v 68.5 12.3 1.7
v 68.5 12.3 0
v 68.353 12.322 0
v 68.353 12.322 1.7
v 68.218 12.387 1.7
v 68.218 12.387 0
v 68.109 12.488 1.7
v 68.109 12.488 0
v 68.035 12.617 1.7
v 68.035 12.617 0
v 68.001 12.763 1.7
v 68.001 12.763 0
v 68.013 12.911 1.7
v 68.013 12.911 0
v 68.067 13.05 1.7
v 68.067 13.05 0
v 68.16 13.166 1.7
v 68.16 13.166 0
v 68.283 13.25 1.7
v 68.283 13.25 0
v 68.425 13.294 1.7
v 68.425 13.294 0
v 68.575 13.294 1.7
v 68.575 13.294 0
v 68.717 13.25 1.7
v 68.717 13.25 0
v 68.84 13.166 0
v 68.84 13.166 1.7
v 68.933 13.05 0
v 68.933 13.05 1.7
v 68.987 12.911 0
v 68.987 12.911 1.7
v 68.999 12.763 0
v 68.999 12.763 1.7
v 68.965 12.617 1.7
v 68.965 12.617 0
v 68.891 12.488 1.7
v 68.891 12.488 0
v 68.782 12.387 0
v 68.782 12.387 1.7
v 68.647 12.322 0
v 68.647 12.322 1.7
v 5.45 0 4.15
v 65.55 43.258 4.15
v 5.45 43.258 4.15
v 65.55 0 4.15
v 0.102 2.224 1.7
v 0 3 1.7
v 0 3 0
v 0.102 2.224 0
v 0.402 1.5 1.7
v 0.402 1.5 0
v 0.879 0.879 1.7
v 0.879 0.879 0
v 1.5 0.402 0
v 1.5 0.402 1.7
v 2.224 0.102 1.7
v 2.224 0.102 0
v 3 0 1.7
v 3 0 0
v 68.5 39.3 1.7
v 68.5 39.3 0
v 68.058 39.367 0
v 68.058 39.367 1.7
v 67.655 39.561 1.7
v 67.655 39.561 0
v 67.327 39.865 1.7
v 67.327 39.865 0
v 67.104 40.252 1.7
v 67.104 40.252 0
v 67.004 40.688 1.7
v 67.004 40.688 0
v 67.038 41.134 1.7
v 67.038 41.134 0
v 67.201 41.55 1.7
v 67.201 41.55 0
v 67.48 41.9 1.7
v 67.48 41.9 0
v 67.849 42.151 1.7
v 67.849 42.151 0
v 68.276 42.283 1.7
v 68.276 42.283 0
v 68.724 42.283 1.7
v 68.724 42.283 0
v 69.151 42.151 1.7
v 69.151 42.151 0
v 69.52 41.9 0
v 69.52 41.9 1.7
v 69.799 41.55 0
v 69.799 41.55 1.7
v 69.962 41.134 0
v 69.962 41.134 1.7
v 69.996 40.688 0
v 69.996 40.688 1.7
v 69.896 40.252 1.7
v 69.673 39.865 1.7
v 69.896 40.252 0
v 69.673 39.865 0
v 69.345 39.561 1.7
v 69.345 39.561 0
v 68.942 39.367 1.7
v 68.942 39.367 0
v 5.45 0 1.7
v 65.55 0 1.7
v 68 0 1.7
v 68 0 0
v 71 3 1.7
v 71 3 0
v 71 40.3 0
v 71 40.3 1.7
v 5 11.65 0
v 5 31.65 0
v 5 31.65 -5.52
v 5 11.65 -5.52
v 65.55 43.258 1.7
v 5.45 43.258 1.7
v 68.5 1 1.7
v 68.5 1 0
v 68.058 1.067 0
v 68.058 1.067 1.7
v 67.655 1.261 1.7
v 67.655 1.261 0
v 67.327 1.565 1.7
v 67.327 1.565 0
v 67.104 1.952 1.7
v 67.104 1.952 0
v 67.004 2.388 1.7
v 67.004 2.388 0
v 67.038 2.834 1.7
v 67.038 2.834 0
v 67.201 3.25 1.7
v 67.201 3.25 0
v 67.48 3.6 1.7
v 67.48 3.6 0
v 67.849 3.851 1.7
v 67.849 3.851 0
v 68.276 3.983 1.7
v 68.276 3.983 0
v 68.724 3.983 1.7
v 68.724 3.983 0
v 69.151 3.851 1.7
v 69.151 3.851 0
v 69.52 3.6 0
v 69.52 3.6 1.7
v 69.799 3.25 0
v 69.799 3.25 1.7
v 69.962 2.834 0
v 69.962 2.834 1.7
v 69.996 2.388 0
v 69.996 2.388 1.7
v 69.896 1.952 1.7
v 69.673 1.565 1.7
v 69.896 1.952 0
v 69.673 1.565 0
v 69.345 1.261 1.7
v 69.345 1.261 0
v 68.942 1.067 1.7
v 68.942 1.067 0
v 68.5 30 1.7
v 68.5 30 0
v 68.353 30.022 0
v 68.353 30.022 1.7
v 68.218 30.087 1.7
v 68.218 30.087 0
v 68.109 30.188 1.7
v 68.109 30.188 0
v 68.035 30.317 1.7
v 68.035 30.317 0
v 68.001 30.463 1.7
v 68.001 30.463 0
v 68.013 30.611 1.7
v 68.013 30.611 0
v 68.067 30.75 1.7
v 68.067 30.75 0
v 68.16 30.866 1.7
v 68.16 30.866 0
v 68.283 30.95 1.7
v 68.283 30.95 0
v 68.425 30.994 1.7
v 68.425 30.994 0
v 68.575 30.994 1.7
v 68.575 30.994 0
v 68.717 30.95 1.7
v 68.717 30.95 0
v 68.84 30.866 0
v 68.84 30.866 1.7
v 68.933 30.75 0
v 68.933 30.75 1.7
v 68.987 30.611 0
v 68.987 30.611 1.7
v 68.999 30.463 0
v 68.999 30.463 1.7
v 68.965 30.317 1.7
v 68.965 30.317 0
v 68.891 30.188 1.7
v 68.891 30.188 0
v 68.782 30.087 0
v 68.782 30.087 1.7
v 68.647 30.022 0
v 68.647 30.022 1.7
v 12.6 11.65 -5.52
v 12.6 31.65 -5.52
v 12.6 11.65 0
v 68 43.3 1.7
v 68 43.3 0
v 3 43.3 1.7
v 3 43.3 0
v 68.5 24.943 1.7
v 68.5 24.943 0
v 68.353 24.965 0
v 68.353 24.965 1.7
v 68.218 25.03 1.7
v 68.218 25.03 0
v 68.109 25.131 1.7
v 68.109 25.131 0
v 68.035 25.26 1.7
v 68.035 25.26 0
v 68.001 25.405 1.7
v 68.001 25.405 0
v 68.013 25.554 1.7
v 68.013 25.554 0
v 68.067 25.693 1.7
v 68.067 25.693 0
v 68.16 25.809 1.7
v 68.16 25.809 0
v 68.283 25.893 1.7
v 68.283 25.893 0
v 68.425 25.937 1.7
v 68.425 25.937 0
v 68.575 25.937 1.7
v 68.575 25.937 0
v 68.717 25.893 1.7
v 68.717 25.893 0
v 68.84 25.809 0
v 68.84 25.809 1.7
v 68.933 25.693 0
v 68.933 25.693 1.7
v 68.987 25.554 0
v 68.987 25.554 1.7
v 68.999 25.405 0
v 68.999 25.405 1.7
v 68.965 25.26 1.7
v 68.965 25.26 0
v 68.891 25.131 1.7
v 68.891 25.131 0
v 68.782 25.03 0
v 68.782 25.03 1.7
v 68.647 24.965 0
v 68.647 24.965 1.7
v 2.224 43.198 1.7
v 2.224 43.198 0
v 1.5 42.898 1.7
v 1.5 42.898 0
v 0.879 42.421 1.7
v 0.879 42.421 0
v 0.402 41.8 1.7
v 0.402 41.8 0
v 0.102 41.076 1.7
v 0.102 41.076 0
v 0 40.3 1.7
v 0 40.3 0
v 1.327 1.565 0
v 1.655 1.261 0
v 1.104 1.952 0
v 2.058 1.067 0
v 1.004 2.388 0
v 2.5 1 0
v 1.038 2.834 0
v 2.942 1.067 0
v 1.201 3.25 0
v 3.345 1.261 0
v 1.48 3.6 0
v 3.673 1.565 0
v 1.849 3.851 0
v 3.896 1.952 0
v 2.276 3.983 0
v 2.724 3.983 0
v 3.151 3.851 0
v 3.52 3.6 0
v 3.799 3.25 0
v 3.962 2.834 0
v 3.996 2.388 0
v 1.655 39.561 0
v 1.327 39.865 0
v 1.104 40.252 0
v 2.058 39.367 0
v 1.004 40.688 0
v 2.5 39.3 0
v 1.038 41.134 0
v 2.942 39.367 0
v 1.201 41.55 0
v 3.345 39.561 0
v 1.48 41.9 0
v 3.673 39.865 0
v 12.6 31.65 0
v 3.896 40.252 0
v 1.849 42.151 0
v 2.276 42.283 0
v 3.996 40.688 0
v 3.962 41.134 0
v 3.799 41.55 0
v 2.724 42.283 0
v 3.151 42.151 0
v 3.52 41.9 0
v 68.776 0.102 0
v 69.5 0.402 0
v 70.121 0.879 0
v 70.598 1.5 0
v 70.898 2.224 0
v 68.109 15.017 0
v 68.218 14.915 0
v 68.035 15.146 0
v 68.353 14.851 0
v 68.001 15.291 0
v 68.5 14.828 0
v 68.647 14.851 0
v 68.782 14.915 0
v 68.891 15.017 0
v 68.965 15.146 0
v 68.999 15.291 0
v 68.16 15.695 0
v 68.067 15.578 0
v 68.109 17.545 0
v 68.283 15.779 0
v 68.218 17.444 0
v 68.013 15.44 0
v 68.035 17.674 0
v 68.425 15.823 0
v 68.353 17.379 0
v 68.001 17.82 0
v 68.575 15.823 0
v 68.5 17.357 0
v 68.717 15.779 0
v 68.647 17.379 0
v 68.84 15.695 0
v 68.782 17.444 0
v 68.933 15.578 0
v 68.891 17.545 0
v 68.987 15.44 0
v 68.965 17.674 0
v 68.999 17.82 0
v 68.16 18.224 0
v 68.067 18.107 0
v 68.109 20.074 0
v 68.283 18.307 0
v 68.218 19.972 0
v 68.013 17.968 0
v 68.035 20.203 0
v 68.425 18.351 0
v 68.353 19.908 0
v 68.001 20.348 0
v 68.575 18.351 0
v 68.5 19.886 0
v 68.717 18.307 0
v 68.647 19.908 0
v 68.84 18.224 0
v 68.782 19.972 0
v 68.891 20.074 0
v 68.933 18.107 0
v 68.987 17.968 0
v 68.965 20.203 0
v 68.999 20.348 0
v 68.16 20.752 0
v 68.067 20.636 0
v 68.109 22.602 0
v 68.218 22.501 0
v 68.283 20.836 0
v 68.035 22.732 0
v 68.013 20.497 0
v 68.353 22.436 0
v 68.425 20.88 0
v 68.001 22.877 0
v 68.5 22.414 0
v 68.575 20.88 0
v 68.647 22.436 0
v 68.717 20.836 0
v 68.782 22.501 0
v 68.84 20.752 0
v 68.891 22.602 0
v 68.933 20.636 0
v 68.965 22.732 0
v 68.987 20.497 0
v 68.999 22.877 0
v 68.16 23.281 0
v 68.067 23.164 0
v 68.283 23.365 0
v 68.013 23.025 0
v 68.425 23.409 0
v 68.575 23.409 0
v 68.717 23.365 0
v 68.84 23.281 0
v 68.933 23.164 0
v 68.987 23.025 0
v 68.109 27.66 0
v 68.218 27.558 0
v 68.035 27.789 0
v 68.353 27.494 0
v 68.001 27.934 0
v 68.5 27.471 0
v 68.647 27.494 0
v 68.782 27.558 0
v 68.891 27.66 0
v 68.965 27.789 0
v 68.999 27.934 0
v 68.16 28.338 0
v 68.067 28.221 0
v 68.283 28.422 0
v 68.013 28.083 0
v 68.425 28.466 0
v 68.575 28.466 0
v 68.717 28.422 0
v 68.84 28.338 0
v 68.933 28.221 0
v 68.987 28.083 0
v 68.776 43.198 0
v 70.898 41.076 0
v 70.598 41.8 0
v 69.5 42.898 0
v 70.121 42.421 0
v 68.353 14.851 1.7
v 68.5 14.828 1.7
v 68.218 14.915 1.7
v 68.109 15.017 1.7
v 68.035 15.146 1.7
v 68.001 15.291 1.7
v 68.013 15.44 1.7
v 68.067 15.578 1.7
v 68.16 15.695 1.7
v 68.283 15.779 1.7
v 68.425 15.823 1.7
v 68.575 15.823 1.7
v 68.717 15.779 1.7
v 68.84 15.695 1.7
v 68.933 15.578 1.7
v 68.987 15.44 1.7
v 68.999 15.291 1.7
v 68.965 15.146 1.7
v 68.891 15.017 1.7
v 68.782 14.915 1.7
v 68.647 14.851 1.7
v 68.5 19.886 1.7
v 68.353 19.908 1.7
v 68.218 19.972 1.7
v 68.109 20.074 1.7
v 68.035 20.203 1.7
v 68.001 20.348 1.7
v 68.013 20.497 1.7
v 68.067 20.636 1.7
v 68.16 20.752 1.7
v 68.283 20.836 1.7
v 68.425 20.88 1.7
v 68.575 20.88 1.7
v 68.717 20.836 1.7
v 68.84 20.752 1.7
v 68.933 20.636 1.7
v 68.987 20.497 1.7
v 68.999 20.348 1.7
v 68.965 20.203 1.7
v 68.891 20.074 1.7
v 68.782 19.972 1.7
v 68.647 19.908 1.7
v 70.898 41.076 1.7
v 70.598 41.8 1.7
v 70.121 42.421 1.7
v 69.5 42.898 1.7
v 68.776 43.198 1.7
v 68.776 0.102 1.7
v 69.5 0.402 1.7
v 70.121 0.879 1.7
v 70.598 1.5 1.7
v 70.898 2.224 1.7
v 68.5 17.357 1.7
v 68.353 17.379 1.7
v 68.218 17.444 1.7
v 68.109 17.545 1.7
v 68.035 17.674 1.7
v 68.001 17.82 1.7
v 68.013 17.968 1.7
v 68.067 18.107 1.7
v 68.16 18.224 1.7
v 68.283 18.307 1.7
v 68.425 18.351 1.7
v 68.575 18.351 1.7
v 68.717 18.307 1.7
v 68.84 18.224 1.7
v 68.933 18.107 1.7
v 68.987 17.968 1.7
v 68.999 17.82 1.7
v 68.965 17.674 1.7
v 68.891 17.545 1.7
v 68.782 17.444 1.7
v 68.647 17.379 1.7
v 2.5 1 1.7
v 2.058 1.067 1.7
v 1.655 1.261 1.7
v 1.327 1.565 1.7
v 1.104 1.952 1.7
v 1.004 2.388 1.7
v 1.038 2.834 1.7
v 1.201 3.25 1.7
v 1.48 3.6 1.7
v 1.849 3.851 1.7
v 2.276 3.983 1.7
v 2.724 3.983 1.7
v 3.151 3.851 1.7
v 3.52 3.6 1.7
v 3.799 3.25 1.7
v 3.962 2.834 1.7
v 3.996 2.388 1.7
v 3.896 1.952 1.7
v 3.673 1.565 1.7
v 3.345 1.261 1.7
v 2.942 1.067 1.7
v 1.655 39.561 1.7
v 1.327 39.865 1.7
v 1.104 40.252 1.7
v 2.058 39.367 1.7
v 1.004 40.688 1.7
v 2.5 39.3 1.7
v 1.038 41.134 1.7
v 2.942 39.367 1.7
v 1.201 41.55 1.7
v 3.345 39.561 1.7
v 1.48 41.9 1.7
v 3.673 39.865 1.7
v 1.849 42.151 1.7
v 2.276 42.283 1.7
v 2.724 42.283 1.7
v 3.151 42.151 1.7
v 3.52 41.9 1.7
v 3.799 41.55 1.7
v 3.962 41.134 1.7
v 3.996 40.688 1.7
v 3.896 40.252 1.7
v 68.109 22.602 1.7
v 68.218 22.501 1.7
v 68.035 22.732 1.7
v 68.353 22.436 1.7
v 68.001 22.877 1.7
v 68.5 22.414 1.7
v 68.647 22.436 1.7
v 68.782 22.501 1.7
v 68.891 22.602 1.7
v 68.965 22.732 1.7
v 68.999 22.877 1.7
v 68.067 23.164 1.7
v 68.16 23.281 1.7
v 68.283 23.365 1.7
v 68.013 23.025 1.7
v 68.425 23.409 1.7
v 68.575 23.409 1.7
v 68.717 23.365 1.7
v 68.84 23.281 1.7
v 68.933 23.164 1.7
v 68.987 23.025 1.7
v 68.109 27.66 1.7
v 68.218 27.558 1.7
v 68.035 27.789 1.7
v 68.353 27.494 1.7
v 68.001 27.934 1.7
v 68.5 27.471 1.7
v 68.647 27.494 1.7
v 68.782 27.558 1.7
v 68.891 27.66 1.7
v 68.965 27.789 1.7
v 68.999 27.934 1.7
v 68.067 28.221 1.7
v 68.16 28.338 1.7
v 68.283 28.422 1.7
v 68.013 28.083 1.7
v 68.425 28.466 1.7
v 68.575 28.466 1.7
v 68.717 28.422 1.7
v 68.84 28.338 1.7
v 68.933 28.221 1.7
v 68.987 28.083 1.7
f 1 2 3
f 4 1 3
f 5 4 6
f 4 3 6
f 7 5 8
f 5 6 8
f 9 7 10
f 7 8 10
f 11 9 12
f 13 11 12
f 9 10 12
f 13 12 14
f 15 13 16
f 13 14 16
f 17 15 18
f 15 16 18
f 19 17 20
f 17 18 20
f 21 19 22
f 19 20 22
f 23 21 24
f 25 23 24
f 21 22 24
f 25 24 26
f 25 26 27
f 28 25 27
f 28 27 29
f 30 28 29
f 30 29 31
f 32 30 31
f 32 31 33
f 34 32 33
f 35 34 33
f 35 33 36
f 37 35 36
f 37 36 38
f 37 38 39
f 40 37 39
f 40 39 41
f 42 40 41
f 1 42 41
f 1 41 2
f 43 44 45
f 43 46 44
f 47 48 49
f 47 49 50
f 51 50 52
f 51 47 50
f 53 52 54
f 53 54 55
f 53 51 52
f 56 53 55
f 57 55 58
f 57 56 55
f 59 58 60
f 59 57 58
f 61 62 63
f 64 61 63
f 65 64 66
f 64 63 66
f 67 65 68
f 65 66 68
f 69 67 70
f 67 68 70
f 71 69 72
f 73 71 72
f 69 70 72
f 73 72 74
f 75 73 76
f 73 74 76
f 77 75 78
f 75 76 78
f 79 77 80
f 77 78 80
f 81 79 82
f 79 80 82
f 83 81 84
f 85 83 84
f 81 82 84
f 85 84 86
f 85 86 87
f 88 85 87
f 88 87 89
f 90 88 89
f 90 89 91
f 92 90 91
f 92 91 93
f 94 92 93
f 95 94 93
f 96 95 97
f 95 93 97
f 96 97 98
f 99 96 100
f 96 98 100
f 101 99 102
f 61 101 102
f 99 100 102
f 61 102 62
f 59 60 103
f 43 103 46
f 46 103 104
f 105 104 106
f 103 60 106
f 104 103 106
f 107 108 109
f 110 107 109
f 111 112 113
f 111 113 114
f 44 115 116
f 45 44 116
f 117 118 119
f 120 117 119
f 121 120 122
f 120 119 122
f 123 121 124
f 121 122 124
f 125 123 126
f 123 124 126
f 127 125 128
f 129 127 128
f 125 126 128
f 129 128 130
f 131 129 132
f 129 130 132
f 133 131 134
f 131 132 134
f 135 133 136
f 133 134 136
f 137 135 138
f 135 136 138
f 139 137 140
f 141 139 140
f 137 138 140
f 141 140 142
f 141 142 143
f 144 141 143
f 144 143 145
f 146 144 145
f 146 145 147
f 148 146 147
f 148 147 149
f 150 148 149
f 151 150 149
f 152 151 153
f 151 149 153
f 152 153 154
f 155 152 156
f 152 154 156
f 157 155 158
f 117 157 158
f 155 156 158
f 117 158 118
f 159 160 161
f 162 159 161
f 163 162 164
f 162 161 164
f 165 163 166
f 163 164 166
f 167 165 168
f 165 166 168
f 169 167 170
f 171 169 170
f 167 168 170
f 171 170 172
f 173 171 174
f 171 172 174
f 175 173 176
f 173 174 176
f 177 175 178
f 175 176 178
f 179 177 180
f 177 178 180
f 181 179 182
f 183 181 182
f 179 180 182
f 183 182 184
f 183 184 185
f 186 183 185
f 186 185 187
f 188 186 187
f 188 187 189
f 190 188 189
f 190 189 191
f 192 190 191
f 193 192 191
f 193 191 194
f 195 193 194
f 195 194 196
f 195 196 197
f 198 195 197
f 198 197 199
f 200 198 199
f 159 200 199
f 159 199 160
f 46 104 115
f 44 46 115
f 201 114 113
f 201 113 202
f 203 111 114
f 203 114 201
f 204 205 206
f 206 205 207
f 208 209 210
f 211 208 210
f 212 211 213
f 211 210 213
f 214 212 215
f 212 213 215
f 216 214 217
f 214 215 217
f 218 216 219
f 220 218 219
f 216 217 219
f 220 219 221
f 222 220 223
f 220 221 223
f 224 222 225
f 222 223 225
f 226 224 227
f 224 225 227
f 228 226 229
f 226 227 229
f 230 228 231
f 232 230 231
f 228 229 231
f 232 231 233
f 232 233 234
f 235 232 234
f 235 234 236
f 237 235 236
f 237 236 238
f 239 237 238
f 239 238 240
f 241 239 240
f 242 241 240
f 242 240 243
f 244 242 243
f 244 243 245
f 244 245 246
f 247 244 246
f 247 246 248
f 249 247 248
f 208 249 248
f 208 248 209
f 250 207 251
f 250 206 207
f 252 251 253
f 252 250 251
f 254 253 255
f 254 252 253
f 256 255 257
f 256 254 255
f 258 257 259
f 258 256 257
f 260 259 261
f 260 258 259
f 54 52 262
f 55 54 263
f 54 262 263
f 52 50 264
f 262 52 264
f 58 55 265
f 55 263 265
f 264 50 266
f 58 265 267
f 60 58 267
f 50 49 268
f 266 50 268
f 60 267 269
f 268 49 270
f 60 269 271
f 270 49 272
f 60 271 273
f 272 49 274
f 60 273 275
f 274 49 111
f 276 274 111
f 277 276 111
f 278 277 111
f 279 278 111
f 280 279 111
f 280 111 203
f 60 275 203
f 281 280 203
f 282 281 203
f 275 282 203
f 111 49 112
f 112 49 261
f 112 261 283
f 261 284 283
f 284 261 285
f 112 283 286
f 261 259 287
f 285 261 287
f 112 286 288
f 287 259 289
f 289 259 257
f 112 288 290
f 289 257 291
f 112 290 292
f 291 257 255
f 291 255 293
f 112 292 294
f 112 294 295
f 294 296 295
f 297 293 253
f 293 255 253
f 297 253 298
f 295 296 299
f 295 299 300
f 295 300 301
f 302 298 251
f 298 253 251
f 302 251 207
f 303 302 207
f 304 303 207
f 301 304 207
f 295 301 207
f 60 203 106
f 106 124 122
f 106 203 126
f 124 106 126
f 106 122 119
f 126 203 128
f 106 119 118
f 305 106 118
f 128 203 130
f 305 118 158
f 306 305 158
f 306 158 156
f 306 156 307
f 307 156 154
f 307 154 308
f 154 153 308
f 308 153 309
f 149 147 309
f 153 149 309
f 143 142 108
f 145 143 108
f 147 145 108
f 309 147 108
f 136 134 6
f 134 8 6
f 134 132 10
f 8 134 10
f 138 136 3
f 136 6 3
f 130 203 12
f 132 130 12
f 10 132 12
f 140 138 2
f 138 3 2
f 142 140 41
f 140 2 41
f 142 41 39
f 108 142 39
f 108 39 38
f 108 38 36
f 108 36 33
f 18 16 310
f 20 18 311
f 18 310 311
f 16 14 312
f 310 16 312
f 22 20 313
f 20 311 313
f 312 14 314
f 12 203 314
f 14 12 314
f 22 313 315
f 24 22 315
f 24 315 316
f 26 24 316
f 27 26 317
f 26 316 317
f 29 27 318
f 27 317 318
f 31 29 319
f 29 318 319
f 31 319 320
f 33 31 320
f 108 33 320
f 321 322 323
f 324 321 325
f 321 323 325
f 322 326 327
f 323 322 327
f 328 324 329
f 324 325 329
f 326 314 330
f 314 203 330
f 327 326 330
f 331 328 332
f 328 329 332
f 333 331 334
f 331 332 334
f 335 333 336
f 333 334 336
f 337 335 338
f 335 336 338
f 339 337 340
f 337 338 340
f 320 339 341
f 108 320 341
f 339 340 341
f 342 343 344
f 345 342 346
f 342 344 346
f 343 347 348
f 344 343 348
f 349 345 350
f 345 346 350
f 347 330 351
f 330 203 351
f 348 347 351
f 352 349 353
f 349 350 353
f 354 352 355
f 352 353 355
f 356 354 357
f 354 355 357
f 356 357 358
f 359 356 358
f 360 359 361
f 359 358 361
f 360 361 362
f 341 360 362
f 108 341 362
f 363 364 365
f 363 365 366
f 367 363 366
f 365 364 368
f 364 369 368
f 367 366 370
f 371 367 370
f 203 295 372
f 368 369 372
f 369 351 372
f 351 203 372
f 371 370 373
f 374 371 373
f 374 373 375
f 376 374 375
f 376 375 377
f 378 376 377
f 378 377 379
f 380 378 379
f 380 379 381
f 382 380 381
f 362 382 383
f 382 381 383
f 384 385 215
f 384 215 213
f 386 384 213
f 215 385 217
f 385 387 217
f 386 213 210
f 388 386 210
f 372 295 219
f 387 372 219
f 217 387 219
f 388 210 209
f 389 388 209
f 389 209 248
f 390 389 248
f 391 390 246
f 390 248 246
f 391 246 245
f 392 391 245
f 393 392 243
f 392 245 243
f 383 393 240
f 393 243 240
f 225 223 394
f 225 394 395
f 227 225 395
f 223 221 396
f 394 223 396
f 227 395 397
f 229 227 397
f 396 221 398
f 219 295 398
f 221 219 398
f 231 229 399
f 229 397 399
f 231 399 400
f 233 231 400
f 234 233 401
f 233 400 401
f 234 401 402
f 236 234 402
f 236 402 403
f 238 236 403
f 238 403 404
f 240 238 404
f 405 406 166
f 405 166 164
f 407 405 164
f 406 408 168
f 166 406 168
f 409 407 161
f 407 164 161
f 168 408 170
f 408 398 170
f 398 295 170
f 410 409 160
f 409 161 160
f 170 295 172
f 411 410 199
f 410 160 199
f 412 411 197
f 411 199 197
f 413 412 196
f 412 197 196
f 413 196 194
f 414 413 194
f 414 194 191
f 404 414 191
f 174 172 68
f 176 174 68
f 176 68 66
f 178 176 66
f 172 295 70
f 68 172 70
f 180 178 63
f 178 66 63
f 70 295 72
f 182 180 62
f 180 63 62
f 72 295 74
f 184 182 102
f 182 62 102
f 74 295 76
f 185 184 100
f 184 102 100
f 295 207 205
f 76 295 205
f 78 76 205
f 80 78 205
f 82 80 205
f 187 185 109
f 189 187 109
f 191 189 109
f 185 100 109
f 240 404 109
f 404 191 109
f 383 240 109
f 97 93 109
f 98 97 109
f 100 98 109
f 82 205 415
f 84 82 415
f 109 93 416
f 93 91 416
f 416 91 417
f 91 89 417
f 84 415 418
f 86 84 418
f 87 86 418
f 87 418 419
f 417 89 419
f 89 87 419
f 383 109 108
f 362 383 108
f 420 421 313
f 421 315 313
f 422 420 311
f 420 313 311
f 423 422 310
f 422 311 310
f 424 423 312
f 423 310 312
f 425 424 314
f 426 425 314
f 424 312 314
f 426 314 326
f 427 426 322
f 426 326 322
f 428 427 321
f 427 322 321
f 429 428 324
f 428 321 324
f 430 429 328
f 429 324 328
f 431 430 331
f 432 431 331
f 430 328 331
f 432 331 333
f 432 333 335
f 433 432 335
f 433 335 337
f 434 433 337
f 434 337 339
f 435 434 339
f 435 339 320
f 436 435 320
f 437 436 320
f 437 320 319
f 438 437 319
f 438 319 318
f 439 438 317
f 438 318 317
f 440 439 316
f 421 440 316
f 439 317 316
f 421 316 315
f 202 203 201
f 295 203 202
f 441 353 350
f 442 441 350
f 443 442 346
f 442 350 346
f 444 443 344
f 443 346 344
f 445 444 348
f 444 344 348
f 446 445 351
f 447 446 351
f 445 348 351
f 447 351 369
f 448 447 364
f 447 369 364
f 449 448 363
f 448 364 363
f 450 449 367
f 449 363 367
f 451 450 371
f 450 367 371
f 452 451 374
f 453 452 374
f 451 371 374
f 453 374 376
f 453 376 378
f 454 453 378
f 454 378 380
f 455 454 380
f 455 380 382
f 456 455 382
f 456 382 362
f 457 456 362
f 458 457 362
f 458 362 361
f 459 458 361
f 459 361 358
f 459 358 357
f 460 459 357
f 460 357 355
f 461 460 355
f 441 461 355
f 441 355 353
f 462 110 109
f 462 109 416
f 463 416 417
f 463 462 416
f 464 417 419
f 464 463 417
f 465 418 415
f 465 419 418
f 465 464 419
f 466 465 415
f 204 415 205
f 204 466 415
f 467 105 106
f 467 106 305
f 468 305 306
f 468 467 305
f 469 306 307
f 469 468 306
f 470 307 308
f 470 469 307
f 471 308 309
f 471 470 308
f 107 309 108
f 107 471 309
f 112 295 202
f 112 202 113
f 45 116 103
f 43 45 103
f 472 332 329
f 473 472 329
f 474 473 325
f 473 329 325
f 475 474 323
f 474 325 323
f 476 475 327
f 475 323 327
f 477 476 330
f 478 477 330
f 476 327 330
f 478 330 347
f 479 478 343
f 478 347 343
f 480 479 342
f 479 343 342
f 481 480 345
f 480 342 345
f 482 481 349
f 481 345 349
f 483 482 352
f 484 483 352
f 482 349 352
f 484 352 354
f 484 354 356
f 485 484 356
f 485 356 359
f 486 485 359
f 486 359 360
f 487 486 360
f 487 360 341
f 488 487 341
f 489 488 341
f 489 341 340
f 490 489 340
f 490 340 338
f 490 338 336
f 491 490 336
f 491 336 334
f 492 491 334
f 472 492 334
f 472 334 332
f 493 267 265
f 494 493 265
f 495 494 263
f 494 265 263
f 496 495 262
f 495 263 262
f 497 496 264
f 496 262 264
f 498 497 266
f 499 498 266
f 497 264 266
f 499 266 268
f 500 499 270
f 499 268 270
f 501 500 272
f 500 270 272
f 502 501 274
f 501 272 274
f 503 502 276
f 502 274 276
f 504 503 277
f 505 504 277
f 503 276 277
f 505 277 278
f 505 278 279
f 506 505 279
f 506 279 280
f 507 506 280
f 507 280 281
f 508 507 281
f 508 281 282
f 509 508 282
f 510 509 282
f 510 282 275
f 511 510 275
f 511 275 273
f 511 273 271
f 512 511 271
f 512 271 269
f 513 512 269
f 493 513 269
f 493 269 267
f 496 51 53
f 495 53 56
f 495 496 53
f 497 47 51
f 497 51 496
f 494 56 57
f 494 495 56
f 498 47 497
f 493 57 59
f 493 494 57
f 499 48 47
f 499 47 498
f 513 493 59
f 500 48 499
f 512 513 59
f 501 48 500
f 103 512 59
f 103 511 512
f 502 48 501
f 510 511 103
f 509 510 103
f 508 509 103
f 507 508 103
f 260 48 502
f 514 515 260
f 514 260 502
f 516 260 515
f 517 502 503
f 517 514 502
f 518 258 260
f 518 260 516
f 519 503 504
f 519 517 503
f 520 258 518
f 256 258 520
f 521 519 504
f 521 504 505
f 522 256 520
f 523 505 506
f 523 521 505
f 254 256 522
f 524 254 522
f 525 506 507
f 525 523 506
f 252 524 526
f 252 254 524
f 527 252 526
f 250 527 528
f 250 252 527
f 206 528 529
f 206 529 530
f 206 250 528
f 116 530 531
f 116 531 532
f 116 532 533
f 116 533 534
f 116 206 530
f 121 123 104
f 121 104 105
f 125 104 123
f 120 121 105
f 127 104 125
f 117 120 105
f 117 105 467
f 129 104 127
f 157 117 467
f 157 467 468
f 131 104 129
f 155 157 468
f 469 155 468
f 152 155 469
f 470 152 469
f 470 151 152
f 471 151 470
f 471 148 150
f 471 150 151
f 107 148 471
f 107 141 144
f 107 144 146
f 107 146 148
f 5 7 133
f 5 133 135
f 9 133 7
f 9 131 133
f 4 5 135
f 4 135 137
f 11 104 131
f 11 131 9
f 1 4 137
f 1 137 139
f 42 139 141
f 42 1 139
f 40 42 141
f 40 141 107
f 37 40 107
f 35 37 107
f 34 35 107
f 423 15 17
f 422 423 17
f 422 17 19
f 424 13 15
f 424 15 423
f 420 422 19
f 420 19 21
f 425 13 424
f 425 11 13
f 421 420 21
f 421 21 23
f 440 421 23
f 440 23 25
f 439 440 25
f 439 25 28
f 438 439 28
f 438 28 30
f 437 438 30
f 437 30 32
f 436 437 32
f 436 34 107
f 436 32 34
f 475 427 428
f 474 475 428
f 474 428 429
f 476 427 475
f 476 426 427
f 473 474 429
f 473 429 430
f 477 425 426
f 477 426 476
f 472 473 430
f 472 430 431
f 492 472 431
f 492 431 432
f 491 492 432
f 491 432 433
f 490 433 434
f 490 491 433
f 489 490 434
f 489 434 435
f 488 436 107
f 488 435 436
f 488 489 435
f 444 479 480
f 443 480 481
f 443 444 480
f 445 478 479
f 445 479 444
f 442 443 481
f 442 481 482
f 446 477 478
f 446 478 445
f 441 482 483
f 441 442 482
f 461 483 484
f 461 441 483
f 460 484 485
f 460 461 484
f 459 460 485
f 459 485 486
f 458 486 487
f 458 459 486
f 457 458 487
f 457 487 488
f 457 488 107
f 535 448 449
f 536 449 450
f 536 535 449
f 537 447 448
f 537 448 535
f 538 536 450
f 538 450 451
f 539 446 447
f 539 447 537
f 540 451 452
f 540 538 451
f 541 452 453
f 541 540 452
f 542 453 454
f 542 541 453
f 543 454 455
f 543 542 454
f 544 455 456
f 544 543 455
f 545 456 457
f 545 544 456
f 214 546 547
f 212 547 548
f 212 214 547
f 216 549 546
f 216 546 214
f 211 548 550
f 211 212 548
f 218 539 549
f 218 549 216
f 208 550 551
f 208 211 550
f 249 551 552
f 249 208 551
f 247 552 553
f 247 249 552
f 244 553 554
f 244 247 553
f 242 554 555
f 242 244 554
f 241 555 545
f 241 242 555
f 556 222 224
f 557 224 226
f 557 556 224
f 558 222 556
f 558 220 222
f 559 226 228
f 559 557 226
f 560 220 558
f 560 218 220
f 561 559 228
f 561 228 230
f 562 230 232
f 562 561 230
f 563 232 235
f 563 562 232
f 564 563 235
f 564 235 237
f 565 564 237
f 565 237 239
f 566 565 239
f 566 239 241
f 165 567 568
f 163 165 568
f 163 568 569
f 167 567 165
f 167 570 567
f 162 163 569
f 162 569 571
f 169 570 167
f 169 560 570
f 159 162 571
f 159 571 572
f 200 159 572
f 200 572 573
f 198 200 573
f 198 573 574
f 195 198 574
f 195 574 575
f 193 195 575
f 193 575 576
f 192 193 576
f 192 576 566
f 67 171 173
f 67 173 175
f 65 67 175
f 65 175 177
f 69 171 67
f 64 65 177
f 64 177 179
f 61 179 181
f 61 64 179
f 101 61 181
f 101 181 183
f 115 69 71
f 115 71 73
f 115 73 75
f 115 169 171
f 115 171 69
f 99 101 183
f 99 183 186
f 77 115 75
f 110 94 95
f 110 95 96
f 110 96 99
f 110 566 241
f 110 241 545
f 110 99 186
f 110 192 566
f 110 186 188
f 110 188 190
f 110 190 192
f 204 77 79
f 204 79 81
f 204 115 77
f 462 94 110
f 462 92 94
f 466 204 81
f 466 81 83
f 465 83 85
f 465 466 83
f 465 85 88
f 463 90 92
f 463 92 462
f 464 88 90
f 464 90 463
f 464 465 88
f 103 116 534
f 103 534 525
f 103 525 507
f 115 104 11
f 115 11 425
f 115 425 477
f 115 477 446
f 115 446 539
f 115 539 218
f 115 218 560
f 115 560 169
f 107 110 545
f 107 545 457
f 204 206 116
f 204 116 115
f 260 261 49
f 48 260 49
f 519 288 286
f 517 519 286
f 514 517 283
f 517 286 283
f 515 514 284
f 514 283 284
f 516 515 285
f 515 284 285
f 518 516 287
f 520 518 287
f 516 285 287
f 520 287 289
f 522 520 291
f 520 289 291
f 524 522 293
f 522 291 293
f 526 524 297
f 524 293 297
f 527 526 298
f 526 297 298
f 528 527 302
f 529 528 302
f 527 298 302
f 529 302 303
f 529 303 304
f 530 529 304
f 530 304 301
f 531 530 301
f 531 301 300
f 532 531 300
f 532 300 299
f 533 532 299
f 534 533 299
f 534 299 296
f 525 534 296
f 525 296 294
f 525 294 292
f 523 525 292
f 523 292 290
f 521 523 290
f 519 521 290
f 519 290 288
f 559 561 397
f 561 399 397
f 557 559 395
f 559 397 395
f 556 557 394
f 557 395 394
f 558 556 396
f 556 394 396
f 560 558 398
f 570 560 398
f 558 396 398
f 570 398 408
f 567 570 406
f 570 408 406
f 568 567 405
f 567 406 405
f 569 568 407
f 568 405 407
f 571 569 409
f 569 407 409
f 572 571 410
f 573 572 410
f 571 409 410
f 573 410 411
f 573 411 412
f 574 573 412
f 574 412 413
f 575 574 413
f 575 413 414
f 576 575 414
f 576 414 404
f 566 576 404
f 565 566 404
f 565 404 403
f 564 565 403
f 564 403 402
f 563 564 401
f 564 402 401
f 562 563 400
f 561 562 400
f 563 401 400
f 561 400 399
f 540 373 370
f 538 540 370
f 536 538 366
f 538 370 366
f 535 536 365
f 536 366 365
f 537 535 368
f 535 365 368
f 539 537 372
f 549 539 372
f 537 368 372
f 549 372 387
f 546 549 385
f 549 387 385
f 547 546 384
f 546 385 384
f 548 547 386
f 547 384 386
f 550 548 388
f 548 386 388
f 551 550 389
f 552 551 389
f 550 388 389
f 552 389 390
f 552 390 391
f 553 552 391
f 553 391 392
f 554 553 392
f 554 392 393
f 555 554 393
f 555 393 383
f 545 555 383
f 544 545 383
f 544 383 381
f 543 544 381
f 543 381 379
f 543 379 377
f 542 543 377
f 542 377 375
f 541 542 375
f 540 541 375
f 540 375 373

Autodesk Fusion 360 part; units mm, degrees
sketch "Sketch1" plane through (0, 0, 0) normal (0, 0, 1) x (1, 0, 0) in component "2.4\" LCD Module"
  line L0 (0, 0) -> (71, 0)
  line L1 (71, 0) -> (71, 43.3)
  line L2 (71, 43.3) -> (0, 43.3)
  line L3 (0, 43.3) -> (0, 0)
  dimension "d1" = 71
  dimension "d2" = 43.3
extrude "Extrude1" add sketch "Sketch1" along normal blind 1.7 in component "2.4\" LCD Module"
hole "Hole1" at (68.5, 2.5, 1.7) direction (0, 0, -1) diameter 3 depth 5 tip angle 180 in component "2.4\" LCD Module"
hole "Hole2" at (68.5, 40.8, 1.7) direction (0, 0, -1) diameter 3 depth 5 tip angle 180 in component "2.4\" LCD Module"
hole "Hole3" at (2.5, 2.5, 1.7) direction (0, 0, -1) diameter 3 depth 5 tip angle 180 in component "2.4\" LCD Module"
hole "Hole4" at (2.5, 40.8, 1.7) direction (0, 0, -1) diameter 3 depth 5 tip angle 180 in component "2.4\" LCD Module"
fillet "Fillet1" radius 3 4 edges at (71, 0, 0.85) (0, 0, 0.85) (71, 43.3, 0.85) (0, 43.3, 0.85) in component "2.4\" LCD Module"
sketch "Sketch2" plane through (0, 0, 1.7) normal (0, 0, 1) x (-1, 0, 0) in component "2.4\" LCD Module"
  arc A0 (-3, -43.3) -> (0, -40.3) centre (-3, -40.3) ccw
  line L0 (0, -40.3) -> (0, -3)
  arc A1 (0, -3) -> (-3, 0) centre (-3, -3) ccw
  line L1 (-3, 0) -> (-68, 0)
  arc A2 (-68, 0) -> (-71, -3) centre (-68, -3) ccw
  line L2 (-71, -3) -> (-71, -40.3)
  arc A3 (-71, -40.3) -> (-68, -43.3) centre (-68, -40.3) ccw
  line L3 (-68, -43.3) -> (-3, -43.3)
  circle A4 centre (-2.5, -40.8) radius 1.5
  circle A5 centre (-2.5, -2.5) radius 1.5
  circle A6 centre (-68.5, -40.8) radius 1.5
  circle A7 centre (-68.5, -2.5) radius 1.5
  line L4 (-5.4496, 0.0416) -> (-65.5496, 0.0416)
  line L5 (-65.5496, 0.0416) -> (-65.5496, -43.2584)
  line L6 (-65.5496, -43.2584) -> (-5.4496, -43.2584)
  line L7 (-5.4496, -43.2584) -> (-5.4496, 0.0416)
  line L8 (-5.4496, 0.0416) -> (-65.5496, -43.2584) construction
  line L9 (-65.5496, 0.0416) -> (-5.4496, -43.2584) construction
  point P0 (-35.4996, -21.6084)
  dimension "d27" = 60.1
  dimension "d28" = 43.3
extrude "Extrude2" add sketch "Sketch2" along normal blind 2.45 contours L1 L5 L6 L7 in component "2.4\" LCD Module"
sketch "Sketch3" plane through (0, 0, 1.7) normal (0, 0, 1) x (-1, 0, 0) in component "2.4\" LCD Module"
  line L0 (-65.5496, -43.2584) -> (-65.5496, 0)
  line L1 (-65.5496, 0) -> (-68, 0)
  arc A0 (-68, 0) -> (-71, -3) centre (-68, -3) ccw
  line L2 (-71, -3) -> (-71, -40.3)
  arc A1 (-71, -40.3) -> (-68, -43.3) centre (-68, -40.3) ccw
  line L3 (-68, -43.3) -> (-3, -43.3)
  arc A2 (-3, -43.3) -> (0, -40.3) centre (-3, -40.3) ccw
  line L4 (0, -40.3) -> (0, -3)
  arc A3 (0, -3) -> (-3, 0) centre (-3, -3) ccw
  line L5 (-3, 0) -> (-5.4496, 0)
  line L6 (-5.4496, 0) -> (-5.4496, -43.2584)
  line L7 (-5.4496, -43.2584) -> (-65.5496, -43.2584)
  circle A4 centre (-2.5, -40.8) radius 1.5
  circle A5 centre (-2.5, -2.5) radius 1.5
  circle A6 centre (-68.5, -40.8) radius 1.5
  circle A7 centre (-68.5, -2.5) radius 1.5
  point P0 (-68.5, -12.7999)
  point P1 (-68.5, -15.3285)
  point P2 (-68.5, -17.857)
  point P3 (-68.5, -20.3856)
  point P4 (-68.5, -22.9142)
  point P5 (-68.5, -25.4427)
  point P6 (-68.5, -27.9713)
  point P7 (-68.5, -30.4999)
  dimension "d33" = 17.7
  dimension "d34" = 0
hole "Hole5" at (68.5, 12.7999, 1.7) at (68.5, 15.3285, 1.7) at (68.5, 17.857, 1.7) at (68.5, 20.3856, 1.7) at (68.5, 22.9142, 1.7) at (68.5, 25.4427, 1.7) at (68.5, 27.9713, 1.7) at (68.5, 30.4999, 1.7) direction (0, 0, -1) diameter 1 depth 5 tip angle 180 in component "2.4\" LCD Module"
sketch "Sketch4" plane through (0, 0, 0) normal (0, 0, -1) x (1, 0, 0) in component "2.4\" LCD Module"
  circle A0 centre (68.5, -27.9713) radius 0.5
  circle A1 centre (68.5, -22.9142) radius 0.5
  circle A2 centre (68.5, -17.857) radius 0.5
  circle A3 centre (68.5, -12.7999) radius 0.5
  circle A4 centre (68.5, -15.3285) radius 0.5
  circle A5 centre (68.5, -20.3856) radius 0.5
  circle A6 centre (68.5, -25.4427) radius 0.5
  circle A7 centre (68.5, -30.4999) radius 0.5
  circle A8 centre (2.5, -40.8) radius 1.5
  circle A9 centre (2.5, -2.5) radius 1.5
  circle A10 centre (68.5, -40.8) radius 1.5
  circle A11 centre (68.5, -2.5) radius 1.5
  arc A12 (0, -40.3) -> (3, -43.3) centre (3, -40.3) ccw
  line L0 (3, -43.3) -> (68, -43.3)
  arc A13 (68, -43.3) -> (71, -40.3) centre (68, -40.3) ccw
  line L1 (71, -40.3) -> (71, -3)
  arc A14 (71, -3) -> (68, 0) centre (68, -3) ccw
  line L2 (68, 0) -> (3, 0)
  arc A15 (3, 0) -> (0, -3) centre (3, -3) ccw
  line L3 (0, -3) -> (0, -40.3)
  line L4 (12.6, -31.65) -> (5, -31.65)
  line L5 (5, -31.65) -> (5, -11.65)
  line L6 (5, -11.65) -> (12.6, -11.65)
  line L7 (12.6, -11.65) -> (12.6, -31.65)
  dimension "d38" = 7.6
  dimension "d39" = 20
extrude "Extrude3" add sketch "Sketch4" along normal blind 5.52 contours L4 L5 L6 L7 in component "2.4\" LCD Module"
component "2.4\" LCD Module" placed x (1, 0, 0) y (0, 1, 0) z (0, 0, 1) at (0, 0, 0)
